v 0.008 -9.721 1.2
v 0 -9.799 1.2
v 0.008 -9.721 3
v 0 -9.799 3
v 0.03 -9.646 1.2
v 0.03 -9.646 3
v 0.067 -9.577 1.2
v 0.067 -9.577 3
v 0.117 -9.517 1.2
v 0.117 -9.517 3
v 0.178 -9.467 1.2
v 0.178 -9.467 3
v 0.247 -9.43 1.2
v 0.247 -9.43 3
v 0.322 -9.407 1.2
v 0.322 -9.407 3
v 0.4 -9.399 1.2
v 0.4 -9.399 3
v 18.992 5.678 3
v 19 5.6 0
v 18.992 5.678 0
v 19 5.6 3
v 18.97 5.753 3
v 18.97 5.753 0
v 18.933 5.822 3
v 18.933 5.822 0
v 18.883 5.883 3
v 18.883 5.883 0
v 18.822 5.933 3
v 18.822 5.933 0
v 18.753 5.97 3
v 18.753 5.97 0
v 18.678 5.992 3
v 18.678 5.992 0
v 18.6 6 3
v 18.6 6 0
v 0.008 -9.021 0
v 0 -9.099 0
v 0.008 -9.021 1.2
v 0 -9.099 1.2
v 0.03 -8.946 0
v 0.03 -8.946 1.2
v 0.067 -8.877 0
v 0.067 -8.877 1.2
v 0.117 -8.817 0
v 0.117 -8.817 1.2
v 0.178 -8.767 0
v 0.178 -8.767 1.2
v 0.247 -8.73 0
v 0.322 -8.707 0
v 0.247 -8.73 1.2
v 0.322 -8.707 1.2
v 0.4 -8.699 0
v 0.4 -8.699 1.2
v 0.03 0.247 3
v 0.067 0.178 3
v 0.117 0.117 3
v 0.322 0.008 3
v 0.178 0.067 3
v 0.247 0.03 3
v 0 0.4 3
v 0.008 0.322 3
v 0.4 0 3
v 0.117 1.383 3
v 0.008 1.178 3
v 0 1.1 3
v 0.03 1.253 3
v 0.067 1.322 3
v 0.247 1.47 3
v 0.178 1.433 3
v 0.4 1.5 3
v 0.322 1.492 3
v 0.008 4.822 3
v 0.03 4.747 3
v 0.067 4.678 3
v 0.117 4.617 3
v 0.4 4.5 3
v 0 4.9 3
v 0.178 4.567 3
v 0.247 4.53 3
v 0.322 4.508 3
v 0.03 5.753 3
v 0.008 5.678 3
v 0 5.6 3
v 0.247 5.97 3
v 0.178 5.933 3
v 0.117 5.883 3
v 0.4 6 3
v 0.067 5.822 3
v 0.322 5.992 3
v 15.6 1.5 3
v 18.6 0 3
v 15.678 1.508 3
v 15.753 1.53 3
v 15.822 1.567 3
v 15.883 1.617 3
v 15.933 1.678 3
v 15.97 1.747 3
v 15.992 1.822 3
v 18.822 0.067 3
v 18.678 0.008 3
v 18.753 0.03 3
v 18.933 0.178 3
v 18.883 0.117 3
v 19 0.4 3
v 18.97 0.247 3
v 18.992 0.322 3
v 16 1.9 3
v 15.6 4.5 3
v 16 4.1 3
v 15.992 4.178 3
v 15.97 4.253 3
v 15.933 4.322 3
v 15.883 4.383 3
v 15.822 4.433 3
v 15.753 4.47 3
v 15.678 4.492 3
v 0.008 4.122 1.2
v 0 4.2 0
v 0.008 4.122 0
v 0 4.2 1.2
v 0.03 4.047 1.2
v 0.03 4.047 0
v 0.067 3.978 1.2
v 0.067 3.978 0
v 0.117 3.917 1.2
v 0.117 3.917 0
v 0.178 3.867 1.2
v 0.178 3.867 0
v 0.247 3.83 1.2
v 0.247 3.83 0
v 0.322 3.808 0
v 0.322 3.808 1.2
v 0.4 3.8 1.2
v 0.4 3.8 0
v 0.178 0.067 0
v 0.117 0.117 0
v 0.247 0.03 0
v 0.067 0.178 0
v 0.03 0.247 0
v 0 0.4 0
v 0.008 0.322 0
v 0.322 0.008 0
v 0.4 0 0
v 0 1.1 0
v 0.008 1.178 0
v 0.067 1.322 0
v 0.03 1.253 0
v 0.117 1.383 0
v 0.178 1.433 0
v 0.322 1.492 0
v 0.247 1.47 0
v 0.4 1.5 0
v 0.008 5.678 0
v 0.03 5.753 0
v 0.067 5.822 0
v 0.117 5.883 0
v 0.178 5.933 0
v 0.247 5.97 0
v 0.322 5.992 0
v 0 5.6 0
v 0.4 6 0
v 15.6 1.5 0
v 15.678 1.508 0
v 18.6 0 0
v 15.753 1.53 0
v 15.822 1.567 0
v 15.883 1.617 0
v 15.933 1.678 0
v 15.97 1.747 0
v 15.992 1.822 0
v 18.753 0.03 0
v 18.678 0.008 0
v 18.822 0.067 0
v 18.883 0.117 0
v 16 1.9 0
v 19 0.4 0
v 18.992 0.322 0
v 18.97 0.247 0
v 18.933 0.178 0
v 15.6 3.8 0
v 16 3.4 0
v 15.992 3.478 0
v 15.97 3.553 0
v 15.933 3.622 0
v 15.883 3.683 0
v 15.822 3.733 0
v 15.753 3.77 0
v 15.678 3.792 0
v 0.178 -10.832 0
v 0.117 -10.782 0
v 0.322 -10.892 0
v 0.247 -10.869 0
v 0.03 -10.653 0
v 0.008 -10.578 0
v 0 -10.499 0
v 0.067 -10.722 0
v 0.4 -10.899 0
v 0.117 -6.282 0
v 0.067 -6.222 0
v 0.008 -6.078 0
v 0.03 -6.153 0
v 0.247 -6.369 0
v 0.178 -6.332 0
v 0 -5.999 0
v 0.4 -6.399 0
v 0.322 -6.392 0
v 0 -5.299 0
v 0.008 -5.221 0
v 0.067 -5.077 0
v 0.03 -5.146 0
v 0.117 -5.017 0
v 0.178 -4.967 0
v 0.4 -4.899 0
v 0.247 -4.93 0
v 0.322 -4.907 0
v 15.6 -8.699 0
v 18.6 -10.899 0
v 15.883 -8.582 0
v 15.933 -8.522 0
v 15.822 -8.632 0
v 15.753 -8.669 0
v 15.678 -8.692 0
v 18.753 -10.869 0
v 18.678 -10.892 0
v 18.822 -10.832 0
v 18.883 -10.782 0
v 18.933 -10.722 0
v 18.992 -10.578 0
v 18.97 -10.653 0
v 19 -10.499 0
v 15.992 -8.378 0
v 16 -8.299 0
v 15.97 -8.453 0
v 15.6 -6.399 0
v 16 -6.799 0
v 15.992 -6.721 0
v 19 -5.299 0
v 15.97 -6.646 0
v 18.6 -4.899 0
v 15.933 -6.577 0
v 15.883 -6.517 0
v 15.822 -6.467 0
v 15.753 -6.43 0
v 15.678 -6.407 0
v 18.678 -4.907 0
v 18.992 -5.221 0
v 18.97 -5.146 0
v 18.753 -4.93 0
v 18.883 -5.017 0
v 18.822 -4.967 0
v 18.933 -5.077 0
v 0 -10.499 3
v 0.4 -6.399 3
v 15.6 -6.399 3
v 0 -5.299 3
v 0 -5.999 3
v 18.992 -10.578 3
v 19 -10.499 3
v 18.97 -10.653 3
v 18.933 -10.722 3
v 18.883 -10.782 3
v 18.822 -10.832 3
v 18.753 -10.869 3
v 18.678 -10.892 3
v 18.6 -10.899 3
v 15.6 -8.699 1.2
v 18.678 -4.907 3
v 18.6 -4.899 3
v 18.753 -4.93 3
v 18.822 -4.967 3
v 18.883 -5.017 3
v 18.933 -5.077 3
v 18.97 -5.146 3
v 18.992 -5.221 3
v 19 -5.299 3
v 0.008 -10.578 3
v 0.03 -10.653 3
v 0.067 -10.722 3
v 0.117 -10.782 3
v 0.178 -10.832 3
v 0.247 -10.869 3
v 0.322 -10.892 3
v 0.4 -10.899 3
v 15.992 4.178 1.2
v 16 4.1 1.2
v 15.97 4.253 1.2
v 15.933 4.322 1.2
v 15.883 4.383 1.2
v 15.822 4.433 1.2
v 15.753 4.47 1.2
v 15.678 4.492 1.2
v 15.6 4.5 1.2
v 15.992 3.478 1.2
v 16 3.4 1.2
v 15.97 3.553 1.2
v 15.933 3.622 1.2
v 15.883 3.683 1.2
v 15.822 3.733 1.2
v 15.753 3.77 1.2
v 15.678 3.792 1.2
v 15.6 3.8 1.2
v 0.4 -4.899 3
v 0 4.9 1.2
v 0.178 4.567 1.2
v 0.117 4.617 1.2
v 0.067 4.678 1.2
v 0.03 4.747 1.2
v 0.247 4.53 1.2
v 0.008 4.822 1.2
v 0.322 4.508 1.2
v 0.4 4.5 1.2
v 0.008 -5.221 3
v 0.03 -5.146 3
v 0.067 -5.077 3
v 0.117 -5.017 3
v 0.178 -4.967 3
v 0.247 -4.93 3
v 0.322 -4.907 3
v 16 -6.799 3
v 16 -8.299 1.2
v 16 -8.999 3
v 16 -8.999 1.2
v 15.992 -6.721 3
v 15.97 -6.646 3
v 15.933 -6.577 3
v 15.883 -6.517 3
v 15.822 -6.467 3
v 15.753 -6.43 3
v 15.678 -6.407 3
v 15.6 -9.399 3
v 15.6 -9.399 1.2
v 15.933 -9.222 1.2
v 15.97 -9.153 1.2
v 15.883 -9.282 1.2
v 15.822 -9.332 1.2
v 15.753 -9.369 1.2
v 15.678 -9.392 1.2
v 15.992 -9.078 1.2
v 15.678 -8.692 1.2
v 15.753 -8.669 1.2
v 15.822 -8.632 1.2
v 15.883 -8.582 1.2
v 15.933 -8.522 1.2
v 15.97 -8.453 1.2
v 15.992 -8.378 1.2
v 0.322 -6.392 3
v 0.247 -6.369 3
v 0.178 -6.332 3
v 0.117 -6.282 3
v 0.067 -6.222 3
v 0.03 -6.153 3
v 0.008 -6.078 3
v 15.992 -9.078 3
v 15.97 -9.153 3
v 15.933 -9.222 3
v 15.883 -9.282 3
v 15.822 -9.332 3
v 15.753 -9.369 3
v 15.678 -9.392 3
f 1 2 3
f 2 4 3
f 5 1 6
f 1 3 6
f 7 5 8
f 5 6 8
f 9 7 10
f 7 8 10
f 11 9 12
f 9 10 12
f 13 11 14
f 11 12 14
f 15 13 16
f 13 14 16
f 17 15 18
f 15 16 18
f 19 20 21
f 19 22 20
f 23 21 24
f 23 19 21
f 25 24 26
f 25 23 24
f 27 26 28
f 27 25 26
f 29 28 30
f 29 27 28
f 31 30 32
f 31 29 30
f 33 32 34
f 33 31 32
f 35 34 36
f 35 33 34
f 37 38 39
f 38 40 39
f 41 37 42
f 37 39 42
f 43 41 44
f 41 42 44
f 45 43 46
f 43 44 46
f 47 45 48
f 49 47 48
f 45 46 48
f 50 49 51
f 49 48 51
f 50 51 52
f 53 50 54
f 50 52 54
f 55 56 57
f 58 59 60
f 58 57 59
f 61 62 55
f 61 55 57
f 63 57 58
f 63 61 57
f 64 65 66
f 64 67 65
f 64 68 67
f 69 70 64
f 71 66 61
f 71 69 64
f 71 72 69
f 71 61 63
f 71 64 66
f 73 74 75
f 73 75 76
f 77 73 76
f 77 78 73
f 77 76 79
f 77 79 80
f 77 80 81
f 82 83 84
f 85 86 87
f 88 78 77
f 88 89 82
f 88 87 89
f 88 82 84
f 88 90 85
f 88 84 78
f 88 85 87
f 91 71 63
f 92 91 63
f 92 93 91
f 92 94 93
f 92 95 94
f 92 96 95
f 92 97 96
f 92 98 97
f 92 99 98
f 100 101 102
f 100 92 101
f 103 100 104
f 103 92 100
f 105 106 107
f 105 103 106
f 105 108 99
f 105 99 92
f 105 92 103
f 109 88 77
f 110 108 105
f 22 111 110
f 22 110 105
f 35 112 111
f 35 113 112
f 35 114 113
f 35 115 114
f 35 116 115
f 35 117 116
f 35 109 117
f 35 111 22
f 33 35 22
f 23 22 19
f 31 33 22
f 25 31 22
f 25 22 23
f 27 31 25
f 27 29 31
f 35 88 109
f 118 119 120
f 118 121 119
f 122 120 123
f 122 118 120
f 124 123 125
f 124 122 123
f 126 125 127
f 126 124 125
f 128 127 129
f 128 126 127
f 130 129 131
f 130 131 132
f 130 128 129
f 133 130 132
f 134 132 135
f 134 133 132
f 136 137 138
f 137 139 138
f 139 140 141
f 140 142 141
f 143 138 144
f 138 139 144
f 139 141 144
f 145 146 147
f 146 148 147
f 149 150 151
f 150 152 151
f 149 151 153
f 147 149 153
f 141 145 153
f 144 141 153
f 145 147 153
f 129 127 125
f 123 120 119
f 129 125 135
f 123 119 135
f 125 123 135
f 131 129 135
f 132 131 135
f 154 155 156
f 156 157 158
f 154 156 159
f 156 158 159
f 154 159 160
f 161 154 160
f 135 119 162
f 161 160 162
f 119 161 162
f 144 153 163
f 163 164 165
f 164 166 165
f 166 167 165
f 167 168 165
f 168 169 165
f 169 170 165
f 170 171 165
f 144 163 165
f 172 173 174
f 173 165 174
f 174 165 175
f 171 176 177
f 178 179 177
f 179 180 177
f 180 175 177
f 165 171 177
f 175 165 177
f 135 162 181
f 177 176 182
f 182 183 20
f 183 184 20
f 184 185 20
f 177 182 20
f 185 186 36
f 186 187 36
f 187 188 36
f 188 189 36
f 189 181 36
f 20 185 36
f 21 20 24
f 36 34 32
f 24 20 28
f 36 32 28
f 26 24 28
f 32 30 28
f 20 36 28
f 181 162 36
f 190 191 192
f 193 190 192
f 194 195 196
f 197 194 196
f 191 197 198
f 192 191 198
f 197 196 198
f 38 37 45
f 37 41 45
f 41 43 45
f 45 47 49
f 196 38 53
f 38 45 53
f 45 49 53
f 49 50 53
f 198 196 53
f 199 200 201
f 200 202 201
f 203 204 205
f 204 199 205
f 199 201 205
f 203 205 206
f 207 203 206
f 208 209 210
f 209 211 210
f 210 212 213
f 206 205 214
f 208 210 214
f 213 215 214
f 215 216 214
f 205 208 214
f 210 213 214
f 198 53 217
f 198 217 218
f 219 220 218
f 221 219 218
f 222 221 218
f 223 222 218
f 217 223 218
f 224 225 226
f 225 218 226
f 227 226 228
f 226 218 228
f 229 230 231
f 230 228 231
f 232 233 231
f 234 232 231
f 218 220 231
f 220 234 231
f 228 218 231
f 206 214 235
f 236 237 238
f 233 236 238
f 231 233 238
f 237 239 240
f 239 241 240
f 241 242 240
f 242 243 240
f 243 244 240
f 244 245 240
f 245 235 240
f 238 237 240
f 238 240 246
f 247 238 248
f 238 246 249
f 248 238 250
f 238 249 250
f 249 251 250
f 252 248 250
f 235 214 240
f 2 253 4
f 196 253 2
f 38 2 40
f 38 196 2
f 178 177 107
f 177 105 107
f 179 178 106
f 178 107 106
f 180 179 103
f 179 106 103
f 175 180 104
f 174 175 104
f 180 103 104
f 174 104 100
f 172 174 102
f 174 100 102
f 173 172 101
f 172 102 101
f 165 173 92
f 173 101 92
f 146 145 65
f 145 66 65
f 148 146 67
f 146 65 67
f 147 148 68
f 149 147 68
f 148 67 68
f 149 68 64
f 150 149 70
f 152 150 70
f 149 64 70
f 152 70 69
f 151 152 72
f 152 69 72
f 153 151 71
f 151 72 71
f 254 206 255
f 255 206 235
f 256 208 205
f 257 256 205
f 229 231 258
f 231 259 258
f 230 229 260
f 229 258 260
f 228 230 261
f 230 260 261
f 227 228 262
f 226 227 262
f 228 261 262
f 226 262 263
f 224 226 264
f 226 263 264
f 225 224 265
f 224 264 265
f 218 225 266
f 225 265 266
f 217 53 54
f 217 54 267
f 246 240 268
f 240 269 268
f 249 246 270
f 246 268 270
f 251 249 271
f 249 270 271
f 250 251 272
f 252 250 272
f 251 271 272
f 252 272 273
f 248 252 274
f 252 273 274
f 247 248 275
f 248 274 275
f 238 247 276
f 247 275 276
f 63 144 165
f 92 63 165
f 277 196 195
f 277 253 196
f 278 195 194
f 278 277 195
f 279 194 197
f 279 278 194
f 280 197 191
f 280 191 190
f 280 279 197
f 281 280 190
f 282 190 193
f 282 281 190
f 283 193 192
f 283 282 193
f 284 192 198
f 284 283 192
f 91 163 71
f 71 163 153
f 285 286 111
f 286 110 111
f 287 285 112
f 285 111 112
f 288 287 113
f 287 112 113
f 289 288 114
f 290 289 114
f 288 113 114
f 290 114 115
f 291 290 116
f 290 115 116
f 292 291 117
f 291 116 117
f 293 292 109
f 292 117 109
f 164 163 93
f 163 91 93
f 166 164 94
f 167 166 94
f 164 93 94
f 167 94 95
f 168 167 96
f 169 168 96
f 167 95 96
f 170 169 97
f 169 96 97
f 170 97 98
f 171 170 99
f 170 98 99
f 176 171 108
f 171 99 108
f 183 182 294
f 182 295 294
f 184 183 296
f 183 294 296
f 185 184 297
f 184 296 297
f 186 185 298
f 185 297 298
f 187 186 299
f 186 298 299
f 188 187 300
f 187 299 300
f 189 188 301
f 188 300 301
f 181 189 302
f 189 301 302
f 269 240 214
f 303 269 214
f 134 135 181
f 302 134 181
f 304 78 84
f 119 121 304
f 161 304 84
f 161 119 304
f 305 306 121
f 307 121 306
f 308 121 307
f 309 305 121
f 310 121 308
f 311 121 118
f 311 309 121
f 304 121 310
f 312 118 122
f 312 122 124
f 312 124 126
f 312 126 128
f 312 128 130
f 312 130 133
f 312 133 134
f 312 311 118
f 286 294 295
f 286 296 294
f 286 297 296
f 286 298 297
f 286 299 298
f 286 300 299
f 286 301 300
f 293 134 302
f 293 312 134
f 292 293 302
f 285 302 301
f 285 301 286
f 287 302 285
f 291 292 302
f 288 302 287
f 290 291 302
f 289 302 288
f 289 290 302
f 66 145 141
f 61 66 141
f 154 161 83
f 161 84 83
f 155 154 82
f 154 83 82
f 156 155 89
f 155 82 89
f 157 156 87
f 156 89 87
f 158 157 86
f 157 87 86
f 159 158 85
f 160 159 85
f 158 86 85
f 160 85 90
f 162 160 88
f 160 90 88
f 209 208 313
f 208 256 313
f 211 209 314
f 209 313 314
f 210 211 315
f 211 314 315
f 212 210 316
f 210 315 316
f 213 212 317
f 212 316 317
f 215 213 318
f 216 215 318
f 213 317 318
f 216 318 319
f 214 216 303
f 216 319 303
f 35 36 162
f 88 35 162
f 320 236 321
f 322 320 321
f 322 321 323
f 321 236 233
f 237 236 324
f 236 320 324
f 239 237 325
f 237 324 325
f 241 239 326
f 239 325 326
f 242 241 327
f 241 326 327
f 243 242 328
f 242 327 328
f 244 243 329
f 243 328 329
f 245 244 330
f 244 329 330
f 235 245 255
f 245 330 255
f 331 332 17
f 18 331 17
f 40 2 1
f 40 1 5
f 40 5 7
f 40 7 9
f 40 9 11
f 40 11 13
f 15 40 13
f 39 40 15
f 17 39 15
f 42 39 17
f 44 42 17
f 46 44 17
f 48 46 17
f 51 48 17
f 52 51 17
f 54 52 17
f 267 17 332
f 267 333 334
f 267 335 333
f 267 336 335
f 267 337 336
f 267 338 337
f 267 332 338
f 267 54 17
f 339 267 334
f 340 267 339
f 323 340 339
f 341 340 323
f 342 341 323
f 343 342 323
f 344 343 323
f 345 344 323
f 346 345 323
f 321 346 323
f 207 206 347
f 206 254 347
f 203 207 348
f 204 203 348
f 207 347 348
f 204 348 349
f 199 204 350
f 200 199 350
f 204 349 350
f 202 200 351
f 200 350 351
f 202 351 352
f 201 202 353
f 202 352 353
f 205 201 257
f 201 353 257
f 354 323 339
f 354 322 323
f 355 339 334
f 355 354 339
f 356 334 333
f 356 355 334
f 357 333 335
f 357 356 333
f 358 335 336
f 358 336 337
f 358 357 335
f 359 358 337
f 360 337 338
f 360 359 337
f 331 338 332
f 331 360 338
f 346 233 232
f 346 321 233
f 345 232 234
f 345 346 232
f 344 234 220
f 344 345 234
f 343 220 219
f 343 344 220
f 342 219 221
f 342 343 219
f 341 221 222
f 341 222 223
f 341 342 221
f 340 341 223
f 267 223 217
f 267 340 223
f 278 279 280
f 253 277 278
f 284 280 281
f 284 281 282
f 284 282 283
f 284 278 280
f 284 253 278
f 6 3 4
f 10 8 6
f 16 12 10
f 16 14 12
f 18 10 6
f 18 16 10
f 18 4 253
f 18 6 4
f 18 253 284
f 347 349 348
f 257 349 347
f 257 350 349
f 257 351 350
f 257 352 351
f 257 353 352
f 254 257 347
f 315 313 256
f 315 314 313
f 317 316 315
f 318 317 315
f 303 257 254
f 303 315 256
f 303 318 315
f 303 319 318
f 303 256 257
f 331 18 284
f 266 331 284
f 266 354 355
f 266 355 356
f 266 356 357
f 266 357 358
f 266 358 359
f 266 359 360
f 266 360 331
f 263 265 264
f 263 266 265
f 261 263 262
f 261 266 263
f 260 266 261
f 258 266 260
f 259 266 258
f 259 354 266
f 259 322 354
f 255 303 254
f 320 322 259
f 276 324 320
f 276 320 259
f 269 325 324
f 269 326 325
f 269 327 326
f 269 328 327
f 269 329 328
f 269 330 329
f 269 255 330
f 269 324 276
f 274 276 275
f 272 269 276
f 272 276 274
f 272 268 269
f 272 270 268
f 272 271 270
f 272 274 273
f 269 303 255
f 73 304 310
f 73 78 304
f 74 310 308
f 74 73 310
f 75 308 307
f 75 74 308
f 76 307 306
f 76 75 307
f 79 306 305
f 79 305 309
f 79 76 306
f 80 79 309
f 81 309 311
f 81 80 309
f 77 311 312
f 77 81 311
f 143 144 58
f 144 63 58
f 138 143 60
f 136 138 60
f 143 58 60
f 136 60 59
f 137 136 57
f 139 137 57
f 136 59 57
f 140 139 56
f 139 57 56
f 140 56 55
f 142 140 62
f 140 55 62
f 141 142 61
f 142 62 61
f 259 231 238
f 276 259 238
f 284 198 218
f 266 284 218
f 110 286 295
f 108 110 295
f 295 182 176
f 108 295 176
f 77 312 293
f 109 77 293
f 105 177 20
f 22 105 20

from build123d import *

# Parameters (mm, degrees)
BOSS_EXTRUDE1_DEPTH   = 3
BOSS_EXTRUDE1_2_DEPTH = 3
SKETCH2_4_W           = 16
SKETCH2_4_H           = 0.7
BOSS_EXTRUDE3_DEPTH   = 1.2
FILLET2_R             = 0.4
FILLET3_R             = 0.4


with BuildPart() as part:
    # Sketch2 → Boss-Extrude1 (new body)
    with BuildSketch(Plane.XY):
        Polygon((0, 1.5), (0, 0), (19, 0), (19, 6), (0, 6), (0, 4.5), (16, 4.5), (16, 1.5), align=None)
    extrude(amount=BOSS_EXTRUDE1_DEPTH)



with BuildPart() as body_2:
    # Sketch2 → Boss-Extrude1 2 (new body)
    with BuildSketch(Plane.XY):
        Polygon((16, -6.399471306), (16, -9.399471306), (0, -9.399471306), (0, -10.899471306), (19, -10.899471306), (19, -4.899471306), (0, -4.899471306), (0, -6.399471306), align=None)
    extrude(amount=BOSS_EXTRUDE1_2_DEPTH)


with BuildPart() as part_1:
    add(part.part)

    add(body_2.part)  # Boss-Extrude3 merges body 2
    # Sketch2<4> → Boss-Extrude3 (add)
    with BuildSketch(Plane.XY):
        with Locations((8, 4.15)):
            Rectangle(SKETCH2_4_W, SKETCH2_4_H)
        with Locations((8, -9.049471306)):
            Rectangle(SKETCH2_4_W, SKETCH2_4_H)
    extrude(amount=BOSS_EXTRUDE3_DEPTH)

    # Fillet2
    fillet2_edges = [part_1.edges().sort_by_distance(p)[0] for p in [
        (0, 4.5, 2.1),
        (16, 1.5, 1.5),
        (16, 3.8, 0.6),
        (16, 4.5, 2.1),
        (19, 6, 1.5),
        (19, 0, 1.5),
        (0, 0, 1.5),
        (0, 1.5, 1.5),
        (0, 3.8, 0.6),
        (0, 6, 1.5),
    ]]
    fillet(fillet2_edges, radius=FILLET2_R)

    # Fillet3
    fillet3_edges = [part_1.edges().sort_by_distance(p)[0] for p in [
        (19, -10.899471306, 1.5),
        (19, -4.899471306, 1.5),
        (16, -6.399471306, 1.5),
        (16, -9.399471306, 2.1),
        (16, -8.699471306, 0.6),
        (0, -10.899471306, 1.5),
        (0, -9.399471306, 2.1),
        (0, -8.699471306, 0.6),
        (0, -4.899471306, 1.5),
        (0, -6.399471306, 1.5),
    ]]
    fillet(fillet3_edges, radius=FILLET3_R)


solid = part_1.part
